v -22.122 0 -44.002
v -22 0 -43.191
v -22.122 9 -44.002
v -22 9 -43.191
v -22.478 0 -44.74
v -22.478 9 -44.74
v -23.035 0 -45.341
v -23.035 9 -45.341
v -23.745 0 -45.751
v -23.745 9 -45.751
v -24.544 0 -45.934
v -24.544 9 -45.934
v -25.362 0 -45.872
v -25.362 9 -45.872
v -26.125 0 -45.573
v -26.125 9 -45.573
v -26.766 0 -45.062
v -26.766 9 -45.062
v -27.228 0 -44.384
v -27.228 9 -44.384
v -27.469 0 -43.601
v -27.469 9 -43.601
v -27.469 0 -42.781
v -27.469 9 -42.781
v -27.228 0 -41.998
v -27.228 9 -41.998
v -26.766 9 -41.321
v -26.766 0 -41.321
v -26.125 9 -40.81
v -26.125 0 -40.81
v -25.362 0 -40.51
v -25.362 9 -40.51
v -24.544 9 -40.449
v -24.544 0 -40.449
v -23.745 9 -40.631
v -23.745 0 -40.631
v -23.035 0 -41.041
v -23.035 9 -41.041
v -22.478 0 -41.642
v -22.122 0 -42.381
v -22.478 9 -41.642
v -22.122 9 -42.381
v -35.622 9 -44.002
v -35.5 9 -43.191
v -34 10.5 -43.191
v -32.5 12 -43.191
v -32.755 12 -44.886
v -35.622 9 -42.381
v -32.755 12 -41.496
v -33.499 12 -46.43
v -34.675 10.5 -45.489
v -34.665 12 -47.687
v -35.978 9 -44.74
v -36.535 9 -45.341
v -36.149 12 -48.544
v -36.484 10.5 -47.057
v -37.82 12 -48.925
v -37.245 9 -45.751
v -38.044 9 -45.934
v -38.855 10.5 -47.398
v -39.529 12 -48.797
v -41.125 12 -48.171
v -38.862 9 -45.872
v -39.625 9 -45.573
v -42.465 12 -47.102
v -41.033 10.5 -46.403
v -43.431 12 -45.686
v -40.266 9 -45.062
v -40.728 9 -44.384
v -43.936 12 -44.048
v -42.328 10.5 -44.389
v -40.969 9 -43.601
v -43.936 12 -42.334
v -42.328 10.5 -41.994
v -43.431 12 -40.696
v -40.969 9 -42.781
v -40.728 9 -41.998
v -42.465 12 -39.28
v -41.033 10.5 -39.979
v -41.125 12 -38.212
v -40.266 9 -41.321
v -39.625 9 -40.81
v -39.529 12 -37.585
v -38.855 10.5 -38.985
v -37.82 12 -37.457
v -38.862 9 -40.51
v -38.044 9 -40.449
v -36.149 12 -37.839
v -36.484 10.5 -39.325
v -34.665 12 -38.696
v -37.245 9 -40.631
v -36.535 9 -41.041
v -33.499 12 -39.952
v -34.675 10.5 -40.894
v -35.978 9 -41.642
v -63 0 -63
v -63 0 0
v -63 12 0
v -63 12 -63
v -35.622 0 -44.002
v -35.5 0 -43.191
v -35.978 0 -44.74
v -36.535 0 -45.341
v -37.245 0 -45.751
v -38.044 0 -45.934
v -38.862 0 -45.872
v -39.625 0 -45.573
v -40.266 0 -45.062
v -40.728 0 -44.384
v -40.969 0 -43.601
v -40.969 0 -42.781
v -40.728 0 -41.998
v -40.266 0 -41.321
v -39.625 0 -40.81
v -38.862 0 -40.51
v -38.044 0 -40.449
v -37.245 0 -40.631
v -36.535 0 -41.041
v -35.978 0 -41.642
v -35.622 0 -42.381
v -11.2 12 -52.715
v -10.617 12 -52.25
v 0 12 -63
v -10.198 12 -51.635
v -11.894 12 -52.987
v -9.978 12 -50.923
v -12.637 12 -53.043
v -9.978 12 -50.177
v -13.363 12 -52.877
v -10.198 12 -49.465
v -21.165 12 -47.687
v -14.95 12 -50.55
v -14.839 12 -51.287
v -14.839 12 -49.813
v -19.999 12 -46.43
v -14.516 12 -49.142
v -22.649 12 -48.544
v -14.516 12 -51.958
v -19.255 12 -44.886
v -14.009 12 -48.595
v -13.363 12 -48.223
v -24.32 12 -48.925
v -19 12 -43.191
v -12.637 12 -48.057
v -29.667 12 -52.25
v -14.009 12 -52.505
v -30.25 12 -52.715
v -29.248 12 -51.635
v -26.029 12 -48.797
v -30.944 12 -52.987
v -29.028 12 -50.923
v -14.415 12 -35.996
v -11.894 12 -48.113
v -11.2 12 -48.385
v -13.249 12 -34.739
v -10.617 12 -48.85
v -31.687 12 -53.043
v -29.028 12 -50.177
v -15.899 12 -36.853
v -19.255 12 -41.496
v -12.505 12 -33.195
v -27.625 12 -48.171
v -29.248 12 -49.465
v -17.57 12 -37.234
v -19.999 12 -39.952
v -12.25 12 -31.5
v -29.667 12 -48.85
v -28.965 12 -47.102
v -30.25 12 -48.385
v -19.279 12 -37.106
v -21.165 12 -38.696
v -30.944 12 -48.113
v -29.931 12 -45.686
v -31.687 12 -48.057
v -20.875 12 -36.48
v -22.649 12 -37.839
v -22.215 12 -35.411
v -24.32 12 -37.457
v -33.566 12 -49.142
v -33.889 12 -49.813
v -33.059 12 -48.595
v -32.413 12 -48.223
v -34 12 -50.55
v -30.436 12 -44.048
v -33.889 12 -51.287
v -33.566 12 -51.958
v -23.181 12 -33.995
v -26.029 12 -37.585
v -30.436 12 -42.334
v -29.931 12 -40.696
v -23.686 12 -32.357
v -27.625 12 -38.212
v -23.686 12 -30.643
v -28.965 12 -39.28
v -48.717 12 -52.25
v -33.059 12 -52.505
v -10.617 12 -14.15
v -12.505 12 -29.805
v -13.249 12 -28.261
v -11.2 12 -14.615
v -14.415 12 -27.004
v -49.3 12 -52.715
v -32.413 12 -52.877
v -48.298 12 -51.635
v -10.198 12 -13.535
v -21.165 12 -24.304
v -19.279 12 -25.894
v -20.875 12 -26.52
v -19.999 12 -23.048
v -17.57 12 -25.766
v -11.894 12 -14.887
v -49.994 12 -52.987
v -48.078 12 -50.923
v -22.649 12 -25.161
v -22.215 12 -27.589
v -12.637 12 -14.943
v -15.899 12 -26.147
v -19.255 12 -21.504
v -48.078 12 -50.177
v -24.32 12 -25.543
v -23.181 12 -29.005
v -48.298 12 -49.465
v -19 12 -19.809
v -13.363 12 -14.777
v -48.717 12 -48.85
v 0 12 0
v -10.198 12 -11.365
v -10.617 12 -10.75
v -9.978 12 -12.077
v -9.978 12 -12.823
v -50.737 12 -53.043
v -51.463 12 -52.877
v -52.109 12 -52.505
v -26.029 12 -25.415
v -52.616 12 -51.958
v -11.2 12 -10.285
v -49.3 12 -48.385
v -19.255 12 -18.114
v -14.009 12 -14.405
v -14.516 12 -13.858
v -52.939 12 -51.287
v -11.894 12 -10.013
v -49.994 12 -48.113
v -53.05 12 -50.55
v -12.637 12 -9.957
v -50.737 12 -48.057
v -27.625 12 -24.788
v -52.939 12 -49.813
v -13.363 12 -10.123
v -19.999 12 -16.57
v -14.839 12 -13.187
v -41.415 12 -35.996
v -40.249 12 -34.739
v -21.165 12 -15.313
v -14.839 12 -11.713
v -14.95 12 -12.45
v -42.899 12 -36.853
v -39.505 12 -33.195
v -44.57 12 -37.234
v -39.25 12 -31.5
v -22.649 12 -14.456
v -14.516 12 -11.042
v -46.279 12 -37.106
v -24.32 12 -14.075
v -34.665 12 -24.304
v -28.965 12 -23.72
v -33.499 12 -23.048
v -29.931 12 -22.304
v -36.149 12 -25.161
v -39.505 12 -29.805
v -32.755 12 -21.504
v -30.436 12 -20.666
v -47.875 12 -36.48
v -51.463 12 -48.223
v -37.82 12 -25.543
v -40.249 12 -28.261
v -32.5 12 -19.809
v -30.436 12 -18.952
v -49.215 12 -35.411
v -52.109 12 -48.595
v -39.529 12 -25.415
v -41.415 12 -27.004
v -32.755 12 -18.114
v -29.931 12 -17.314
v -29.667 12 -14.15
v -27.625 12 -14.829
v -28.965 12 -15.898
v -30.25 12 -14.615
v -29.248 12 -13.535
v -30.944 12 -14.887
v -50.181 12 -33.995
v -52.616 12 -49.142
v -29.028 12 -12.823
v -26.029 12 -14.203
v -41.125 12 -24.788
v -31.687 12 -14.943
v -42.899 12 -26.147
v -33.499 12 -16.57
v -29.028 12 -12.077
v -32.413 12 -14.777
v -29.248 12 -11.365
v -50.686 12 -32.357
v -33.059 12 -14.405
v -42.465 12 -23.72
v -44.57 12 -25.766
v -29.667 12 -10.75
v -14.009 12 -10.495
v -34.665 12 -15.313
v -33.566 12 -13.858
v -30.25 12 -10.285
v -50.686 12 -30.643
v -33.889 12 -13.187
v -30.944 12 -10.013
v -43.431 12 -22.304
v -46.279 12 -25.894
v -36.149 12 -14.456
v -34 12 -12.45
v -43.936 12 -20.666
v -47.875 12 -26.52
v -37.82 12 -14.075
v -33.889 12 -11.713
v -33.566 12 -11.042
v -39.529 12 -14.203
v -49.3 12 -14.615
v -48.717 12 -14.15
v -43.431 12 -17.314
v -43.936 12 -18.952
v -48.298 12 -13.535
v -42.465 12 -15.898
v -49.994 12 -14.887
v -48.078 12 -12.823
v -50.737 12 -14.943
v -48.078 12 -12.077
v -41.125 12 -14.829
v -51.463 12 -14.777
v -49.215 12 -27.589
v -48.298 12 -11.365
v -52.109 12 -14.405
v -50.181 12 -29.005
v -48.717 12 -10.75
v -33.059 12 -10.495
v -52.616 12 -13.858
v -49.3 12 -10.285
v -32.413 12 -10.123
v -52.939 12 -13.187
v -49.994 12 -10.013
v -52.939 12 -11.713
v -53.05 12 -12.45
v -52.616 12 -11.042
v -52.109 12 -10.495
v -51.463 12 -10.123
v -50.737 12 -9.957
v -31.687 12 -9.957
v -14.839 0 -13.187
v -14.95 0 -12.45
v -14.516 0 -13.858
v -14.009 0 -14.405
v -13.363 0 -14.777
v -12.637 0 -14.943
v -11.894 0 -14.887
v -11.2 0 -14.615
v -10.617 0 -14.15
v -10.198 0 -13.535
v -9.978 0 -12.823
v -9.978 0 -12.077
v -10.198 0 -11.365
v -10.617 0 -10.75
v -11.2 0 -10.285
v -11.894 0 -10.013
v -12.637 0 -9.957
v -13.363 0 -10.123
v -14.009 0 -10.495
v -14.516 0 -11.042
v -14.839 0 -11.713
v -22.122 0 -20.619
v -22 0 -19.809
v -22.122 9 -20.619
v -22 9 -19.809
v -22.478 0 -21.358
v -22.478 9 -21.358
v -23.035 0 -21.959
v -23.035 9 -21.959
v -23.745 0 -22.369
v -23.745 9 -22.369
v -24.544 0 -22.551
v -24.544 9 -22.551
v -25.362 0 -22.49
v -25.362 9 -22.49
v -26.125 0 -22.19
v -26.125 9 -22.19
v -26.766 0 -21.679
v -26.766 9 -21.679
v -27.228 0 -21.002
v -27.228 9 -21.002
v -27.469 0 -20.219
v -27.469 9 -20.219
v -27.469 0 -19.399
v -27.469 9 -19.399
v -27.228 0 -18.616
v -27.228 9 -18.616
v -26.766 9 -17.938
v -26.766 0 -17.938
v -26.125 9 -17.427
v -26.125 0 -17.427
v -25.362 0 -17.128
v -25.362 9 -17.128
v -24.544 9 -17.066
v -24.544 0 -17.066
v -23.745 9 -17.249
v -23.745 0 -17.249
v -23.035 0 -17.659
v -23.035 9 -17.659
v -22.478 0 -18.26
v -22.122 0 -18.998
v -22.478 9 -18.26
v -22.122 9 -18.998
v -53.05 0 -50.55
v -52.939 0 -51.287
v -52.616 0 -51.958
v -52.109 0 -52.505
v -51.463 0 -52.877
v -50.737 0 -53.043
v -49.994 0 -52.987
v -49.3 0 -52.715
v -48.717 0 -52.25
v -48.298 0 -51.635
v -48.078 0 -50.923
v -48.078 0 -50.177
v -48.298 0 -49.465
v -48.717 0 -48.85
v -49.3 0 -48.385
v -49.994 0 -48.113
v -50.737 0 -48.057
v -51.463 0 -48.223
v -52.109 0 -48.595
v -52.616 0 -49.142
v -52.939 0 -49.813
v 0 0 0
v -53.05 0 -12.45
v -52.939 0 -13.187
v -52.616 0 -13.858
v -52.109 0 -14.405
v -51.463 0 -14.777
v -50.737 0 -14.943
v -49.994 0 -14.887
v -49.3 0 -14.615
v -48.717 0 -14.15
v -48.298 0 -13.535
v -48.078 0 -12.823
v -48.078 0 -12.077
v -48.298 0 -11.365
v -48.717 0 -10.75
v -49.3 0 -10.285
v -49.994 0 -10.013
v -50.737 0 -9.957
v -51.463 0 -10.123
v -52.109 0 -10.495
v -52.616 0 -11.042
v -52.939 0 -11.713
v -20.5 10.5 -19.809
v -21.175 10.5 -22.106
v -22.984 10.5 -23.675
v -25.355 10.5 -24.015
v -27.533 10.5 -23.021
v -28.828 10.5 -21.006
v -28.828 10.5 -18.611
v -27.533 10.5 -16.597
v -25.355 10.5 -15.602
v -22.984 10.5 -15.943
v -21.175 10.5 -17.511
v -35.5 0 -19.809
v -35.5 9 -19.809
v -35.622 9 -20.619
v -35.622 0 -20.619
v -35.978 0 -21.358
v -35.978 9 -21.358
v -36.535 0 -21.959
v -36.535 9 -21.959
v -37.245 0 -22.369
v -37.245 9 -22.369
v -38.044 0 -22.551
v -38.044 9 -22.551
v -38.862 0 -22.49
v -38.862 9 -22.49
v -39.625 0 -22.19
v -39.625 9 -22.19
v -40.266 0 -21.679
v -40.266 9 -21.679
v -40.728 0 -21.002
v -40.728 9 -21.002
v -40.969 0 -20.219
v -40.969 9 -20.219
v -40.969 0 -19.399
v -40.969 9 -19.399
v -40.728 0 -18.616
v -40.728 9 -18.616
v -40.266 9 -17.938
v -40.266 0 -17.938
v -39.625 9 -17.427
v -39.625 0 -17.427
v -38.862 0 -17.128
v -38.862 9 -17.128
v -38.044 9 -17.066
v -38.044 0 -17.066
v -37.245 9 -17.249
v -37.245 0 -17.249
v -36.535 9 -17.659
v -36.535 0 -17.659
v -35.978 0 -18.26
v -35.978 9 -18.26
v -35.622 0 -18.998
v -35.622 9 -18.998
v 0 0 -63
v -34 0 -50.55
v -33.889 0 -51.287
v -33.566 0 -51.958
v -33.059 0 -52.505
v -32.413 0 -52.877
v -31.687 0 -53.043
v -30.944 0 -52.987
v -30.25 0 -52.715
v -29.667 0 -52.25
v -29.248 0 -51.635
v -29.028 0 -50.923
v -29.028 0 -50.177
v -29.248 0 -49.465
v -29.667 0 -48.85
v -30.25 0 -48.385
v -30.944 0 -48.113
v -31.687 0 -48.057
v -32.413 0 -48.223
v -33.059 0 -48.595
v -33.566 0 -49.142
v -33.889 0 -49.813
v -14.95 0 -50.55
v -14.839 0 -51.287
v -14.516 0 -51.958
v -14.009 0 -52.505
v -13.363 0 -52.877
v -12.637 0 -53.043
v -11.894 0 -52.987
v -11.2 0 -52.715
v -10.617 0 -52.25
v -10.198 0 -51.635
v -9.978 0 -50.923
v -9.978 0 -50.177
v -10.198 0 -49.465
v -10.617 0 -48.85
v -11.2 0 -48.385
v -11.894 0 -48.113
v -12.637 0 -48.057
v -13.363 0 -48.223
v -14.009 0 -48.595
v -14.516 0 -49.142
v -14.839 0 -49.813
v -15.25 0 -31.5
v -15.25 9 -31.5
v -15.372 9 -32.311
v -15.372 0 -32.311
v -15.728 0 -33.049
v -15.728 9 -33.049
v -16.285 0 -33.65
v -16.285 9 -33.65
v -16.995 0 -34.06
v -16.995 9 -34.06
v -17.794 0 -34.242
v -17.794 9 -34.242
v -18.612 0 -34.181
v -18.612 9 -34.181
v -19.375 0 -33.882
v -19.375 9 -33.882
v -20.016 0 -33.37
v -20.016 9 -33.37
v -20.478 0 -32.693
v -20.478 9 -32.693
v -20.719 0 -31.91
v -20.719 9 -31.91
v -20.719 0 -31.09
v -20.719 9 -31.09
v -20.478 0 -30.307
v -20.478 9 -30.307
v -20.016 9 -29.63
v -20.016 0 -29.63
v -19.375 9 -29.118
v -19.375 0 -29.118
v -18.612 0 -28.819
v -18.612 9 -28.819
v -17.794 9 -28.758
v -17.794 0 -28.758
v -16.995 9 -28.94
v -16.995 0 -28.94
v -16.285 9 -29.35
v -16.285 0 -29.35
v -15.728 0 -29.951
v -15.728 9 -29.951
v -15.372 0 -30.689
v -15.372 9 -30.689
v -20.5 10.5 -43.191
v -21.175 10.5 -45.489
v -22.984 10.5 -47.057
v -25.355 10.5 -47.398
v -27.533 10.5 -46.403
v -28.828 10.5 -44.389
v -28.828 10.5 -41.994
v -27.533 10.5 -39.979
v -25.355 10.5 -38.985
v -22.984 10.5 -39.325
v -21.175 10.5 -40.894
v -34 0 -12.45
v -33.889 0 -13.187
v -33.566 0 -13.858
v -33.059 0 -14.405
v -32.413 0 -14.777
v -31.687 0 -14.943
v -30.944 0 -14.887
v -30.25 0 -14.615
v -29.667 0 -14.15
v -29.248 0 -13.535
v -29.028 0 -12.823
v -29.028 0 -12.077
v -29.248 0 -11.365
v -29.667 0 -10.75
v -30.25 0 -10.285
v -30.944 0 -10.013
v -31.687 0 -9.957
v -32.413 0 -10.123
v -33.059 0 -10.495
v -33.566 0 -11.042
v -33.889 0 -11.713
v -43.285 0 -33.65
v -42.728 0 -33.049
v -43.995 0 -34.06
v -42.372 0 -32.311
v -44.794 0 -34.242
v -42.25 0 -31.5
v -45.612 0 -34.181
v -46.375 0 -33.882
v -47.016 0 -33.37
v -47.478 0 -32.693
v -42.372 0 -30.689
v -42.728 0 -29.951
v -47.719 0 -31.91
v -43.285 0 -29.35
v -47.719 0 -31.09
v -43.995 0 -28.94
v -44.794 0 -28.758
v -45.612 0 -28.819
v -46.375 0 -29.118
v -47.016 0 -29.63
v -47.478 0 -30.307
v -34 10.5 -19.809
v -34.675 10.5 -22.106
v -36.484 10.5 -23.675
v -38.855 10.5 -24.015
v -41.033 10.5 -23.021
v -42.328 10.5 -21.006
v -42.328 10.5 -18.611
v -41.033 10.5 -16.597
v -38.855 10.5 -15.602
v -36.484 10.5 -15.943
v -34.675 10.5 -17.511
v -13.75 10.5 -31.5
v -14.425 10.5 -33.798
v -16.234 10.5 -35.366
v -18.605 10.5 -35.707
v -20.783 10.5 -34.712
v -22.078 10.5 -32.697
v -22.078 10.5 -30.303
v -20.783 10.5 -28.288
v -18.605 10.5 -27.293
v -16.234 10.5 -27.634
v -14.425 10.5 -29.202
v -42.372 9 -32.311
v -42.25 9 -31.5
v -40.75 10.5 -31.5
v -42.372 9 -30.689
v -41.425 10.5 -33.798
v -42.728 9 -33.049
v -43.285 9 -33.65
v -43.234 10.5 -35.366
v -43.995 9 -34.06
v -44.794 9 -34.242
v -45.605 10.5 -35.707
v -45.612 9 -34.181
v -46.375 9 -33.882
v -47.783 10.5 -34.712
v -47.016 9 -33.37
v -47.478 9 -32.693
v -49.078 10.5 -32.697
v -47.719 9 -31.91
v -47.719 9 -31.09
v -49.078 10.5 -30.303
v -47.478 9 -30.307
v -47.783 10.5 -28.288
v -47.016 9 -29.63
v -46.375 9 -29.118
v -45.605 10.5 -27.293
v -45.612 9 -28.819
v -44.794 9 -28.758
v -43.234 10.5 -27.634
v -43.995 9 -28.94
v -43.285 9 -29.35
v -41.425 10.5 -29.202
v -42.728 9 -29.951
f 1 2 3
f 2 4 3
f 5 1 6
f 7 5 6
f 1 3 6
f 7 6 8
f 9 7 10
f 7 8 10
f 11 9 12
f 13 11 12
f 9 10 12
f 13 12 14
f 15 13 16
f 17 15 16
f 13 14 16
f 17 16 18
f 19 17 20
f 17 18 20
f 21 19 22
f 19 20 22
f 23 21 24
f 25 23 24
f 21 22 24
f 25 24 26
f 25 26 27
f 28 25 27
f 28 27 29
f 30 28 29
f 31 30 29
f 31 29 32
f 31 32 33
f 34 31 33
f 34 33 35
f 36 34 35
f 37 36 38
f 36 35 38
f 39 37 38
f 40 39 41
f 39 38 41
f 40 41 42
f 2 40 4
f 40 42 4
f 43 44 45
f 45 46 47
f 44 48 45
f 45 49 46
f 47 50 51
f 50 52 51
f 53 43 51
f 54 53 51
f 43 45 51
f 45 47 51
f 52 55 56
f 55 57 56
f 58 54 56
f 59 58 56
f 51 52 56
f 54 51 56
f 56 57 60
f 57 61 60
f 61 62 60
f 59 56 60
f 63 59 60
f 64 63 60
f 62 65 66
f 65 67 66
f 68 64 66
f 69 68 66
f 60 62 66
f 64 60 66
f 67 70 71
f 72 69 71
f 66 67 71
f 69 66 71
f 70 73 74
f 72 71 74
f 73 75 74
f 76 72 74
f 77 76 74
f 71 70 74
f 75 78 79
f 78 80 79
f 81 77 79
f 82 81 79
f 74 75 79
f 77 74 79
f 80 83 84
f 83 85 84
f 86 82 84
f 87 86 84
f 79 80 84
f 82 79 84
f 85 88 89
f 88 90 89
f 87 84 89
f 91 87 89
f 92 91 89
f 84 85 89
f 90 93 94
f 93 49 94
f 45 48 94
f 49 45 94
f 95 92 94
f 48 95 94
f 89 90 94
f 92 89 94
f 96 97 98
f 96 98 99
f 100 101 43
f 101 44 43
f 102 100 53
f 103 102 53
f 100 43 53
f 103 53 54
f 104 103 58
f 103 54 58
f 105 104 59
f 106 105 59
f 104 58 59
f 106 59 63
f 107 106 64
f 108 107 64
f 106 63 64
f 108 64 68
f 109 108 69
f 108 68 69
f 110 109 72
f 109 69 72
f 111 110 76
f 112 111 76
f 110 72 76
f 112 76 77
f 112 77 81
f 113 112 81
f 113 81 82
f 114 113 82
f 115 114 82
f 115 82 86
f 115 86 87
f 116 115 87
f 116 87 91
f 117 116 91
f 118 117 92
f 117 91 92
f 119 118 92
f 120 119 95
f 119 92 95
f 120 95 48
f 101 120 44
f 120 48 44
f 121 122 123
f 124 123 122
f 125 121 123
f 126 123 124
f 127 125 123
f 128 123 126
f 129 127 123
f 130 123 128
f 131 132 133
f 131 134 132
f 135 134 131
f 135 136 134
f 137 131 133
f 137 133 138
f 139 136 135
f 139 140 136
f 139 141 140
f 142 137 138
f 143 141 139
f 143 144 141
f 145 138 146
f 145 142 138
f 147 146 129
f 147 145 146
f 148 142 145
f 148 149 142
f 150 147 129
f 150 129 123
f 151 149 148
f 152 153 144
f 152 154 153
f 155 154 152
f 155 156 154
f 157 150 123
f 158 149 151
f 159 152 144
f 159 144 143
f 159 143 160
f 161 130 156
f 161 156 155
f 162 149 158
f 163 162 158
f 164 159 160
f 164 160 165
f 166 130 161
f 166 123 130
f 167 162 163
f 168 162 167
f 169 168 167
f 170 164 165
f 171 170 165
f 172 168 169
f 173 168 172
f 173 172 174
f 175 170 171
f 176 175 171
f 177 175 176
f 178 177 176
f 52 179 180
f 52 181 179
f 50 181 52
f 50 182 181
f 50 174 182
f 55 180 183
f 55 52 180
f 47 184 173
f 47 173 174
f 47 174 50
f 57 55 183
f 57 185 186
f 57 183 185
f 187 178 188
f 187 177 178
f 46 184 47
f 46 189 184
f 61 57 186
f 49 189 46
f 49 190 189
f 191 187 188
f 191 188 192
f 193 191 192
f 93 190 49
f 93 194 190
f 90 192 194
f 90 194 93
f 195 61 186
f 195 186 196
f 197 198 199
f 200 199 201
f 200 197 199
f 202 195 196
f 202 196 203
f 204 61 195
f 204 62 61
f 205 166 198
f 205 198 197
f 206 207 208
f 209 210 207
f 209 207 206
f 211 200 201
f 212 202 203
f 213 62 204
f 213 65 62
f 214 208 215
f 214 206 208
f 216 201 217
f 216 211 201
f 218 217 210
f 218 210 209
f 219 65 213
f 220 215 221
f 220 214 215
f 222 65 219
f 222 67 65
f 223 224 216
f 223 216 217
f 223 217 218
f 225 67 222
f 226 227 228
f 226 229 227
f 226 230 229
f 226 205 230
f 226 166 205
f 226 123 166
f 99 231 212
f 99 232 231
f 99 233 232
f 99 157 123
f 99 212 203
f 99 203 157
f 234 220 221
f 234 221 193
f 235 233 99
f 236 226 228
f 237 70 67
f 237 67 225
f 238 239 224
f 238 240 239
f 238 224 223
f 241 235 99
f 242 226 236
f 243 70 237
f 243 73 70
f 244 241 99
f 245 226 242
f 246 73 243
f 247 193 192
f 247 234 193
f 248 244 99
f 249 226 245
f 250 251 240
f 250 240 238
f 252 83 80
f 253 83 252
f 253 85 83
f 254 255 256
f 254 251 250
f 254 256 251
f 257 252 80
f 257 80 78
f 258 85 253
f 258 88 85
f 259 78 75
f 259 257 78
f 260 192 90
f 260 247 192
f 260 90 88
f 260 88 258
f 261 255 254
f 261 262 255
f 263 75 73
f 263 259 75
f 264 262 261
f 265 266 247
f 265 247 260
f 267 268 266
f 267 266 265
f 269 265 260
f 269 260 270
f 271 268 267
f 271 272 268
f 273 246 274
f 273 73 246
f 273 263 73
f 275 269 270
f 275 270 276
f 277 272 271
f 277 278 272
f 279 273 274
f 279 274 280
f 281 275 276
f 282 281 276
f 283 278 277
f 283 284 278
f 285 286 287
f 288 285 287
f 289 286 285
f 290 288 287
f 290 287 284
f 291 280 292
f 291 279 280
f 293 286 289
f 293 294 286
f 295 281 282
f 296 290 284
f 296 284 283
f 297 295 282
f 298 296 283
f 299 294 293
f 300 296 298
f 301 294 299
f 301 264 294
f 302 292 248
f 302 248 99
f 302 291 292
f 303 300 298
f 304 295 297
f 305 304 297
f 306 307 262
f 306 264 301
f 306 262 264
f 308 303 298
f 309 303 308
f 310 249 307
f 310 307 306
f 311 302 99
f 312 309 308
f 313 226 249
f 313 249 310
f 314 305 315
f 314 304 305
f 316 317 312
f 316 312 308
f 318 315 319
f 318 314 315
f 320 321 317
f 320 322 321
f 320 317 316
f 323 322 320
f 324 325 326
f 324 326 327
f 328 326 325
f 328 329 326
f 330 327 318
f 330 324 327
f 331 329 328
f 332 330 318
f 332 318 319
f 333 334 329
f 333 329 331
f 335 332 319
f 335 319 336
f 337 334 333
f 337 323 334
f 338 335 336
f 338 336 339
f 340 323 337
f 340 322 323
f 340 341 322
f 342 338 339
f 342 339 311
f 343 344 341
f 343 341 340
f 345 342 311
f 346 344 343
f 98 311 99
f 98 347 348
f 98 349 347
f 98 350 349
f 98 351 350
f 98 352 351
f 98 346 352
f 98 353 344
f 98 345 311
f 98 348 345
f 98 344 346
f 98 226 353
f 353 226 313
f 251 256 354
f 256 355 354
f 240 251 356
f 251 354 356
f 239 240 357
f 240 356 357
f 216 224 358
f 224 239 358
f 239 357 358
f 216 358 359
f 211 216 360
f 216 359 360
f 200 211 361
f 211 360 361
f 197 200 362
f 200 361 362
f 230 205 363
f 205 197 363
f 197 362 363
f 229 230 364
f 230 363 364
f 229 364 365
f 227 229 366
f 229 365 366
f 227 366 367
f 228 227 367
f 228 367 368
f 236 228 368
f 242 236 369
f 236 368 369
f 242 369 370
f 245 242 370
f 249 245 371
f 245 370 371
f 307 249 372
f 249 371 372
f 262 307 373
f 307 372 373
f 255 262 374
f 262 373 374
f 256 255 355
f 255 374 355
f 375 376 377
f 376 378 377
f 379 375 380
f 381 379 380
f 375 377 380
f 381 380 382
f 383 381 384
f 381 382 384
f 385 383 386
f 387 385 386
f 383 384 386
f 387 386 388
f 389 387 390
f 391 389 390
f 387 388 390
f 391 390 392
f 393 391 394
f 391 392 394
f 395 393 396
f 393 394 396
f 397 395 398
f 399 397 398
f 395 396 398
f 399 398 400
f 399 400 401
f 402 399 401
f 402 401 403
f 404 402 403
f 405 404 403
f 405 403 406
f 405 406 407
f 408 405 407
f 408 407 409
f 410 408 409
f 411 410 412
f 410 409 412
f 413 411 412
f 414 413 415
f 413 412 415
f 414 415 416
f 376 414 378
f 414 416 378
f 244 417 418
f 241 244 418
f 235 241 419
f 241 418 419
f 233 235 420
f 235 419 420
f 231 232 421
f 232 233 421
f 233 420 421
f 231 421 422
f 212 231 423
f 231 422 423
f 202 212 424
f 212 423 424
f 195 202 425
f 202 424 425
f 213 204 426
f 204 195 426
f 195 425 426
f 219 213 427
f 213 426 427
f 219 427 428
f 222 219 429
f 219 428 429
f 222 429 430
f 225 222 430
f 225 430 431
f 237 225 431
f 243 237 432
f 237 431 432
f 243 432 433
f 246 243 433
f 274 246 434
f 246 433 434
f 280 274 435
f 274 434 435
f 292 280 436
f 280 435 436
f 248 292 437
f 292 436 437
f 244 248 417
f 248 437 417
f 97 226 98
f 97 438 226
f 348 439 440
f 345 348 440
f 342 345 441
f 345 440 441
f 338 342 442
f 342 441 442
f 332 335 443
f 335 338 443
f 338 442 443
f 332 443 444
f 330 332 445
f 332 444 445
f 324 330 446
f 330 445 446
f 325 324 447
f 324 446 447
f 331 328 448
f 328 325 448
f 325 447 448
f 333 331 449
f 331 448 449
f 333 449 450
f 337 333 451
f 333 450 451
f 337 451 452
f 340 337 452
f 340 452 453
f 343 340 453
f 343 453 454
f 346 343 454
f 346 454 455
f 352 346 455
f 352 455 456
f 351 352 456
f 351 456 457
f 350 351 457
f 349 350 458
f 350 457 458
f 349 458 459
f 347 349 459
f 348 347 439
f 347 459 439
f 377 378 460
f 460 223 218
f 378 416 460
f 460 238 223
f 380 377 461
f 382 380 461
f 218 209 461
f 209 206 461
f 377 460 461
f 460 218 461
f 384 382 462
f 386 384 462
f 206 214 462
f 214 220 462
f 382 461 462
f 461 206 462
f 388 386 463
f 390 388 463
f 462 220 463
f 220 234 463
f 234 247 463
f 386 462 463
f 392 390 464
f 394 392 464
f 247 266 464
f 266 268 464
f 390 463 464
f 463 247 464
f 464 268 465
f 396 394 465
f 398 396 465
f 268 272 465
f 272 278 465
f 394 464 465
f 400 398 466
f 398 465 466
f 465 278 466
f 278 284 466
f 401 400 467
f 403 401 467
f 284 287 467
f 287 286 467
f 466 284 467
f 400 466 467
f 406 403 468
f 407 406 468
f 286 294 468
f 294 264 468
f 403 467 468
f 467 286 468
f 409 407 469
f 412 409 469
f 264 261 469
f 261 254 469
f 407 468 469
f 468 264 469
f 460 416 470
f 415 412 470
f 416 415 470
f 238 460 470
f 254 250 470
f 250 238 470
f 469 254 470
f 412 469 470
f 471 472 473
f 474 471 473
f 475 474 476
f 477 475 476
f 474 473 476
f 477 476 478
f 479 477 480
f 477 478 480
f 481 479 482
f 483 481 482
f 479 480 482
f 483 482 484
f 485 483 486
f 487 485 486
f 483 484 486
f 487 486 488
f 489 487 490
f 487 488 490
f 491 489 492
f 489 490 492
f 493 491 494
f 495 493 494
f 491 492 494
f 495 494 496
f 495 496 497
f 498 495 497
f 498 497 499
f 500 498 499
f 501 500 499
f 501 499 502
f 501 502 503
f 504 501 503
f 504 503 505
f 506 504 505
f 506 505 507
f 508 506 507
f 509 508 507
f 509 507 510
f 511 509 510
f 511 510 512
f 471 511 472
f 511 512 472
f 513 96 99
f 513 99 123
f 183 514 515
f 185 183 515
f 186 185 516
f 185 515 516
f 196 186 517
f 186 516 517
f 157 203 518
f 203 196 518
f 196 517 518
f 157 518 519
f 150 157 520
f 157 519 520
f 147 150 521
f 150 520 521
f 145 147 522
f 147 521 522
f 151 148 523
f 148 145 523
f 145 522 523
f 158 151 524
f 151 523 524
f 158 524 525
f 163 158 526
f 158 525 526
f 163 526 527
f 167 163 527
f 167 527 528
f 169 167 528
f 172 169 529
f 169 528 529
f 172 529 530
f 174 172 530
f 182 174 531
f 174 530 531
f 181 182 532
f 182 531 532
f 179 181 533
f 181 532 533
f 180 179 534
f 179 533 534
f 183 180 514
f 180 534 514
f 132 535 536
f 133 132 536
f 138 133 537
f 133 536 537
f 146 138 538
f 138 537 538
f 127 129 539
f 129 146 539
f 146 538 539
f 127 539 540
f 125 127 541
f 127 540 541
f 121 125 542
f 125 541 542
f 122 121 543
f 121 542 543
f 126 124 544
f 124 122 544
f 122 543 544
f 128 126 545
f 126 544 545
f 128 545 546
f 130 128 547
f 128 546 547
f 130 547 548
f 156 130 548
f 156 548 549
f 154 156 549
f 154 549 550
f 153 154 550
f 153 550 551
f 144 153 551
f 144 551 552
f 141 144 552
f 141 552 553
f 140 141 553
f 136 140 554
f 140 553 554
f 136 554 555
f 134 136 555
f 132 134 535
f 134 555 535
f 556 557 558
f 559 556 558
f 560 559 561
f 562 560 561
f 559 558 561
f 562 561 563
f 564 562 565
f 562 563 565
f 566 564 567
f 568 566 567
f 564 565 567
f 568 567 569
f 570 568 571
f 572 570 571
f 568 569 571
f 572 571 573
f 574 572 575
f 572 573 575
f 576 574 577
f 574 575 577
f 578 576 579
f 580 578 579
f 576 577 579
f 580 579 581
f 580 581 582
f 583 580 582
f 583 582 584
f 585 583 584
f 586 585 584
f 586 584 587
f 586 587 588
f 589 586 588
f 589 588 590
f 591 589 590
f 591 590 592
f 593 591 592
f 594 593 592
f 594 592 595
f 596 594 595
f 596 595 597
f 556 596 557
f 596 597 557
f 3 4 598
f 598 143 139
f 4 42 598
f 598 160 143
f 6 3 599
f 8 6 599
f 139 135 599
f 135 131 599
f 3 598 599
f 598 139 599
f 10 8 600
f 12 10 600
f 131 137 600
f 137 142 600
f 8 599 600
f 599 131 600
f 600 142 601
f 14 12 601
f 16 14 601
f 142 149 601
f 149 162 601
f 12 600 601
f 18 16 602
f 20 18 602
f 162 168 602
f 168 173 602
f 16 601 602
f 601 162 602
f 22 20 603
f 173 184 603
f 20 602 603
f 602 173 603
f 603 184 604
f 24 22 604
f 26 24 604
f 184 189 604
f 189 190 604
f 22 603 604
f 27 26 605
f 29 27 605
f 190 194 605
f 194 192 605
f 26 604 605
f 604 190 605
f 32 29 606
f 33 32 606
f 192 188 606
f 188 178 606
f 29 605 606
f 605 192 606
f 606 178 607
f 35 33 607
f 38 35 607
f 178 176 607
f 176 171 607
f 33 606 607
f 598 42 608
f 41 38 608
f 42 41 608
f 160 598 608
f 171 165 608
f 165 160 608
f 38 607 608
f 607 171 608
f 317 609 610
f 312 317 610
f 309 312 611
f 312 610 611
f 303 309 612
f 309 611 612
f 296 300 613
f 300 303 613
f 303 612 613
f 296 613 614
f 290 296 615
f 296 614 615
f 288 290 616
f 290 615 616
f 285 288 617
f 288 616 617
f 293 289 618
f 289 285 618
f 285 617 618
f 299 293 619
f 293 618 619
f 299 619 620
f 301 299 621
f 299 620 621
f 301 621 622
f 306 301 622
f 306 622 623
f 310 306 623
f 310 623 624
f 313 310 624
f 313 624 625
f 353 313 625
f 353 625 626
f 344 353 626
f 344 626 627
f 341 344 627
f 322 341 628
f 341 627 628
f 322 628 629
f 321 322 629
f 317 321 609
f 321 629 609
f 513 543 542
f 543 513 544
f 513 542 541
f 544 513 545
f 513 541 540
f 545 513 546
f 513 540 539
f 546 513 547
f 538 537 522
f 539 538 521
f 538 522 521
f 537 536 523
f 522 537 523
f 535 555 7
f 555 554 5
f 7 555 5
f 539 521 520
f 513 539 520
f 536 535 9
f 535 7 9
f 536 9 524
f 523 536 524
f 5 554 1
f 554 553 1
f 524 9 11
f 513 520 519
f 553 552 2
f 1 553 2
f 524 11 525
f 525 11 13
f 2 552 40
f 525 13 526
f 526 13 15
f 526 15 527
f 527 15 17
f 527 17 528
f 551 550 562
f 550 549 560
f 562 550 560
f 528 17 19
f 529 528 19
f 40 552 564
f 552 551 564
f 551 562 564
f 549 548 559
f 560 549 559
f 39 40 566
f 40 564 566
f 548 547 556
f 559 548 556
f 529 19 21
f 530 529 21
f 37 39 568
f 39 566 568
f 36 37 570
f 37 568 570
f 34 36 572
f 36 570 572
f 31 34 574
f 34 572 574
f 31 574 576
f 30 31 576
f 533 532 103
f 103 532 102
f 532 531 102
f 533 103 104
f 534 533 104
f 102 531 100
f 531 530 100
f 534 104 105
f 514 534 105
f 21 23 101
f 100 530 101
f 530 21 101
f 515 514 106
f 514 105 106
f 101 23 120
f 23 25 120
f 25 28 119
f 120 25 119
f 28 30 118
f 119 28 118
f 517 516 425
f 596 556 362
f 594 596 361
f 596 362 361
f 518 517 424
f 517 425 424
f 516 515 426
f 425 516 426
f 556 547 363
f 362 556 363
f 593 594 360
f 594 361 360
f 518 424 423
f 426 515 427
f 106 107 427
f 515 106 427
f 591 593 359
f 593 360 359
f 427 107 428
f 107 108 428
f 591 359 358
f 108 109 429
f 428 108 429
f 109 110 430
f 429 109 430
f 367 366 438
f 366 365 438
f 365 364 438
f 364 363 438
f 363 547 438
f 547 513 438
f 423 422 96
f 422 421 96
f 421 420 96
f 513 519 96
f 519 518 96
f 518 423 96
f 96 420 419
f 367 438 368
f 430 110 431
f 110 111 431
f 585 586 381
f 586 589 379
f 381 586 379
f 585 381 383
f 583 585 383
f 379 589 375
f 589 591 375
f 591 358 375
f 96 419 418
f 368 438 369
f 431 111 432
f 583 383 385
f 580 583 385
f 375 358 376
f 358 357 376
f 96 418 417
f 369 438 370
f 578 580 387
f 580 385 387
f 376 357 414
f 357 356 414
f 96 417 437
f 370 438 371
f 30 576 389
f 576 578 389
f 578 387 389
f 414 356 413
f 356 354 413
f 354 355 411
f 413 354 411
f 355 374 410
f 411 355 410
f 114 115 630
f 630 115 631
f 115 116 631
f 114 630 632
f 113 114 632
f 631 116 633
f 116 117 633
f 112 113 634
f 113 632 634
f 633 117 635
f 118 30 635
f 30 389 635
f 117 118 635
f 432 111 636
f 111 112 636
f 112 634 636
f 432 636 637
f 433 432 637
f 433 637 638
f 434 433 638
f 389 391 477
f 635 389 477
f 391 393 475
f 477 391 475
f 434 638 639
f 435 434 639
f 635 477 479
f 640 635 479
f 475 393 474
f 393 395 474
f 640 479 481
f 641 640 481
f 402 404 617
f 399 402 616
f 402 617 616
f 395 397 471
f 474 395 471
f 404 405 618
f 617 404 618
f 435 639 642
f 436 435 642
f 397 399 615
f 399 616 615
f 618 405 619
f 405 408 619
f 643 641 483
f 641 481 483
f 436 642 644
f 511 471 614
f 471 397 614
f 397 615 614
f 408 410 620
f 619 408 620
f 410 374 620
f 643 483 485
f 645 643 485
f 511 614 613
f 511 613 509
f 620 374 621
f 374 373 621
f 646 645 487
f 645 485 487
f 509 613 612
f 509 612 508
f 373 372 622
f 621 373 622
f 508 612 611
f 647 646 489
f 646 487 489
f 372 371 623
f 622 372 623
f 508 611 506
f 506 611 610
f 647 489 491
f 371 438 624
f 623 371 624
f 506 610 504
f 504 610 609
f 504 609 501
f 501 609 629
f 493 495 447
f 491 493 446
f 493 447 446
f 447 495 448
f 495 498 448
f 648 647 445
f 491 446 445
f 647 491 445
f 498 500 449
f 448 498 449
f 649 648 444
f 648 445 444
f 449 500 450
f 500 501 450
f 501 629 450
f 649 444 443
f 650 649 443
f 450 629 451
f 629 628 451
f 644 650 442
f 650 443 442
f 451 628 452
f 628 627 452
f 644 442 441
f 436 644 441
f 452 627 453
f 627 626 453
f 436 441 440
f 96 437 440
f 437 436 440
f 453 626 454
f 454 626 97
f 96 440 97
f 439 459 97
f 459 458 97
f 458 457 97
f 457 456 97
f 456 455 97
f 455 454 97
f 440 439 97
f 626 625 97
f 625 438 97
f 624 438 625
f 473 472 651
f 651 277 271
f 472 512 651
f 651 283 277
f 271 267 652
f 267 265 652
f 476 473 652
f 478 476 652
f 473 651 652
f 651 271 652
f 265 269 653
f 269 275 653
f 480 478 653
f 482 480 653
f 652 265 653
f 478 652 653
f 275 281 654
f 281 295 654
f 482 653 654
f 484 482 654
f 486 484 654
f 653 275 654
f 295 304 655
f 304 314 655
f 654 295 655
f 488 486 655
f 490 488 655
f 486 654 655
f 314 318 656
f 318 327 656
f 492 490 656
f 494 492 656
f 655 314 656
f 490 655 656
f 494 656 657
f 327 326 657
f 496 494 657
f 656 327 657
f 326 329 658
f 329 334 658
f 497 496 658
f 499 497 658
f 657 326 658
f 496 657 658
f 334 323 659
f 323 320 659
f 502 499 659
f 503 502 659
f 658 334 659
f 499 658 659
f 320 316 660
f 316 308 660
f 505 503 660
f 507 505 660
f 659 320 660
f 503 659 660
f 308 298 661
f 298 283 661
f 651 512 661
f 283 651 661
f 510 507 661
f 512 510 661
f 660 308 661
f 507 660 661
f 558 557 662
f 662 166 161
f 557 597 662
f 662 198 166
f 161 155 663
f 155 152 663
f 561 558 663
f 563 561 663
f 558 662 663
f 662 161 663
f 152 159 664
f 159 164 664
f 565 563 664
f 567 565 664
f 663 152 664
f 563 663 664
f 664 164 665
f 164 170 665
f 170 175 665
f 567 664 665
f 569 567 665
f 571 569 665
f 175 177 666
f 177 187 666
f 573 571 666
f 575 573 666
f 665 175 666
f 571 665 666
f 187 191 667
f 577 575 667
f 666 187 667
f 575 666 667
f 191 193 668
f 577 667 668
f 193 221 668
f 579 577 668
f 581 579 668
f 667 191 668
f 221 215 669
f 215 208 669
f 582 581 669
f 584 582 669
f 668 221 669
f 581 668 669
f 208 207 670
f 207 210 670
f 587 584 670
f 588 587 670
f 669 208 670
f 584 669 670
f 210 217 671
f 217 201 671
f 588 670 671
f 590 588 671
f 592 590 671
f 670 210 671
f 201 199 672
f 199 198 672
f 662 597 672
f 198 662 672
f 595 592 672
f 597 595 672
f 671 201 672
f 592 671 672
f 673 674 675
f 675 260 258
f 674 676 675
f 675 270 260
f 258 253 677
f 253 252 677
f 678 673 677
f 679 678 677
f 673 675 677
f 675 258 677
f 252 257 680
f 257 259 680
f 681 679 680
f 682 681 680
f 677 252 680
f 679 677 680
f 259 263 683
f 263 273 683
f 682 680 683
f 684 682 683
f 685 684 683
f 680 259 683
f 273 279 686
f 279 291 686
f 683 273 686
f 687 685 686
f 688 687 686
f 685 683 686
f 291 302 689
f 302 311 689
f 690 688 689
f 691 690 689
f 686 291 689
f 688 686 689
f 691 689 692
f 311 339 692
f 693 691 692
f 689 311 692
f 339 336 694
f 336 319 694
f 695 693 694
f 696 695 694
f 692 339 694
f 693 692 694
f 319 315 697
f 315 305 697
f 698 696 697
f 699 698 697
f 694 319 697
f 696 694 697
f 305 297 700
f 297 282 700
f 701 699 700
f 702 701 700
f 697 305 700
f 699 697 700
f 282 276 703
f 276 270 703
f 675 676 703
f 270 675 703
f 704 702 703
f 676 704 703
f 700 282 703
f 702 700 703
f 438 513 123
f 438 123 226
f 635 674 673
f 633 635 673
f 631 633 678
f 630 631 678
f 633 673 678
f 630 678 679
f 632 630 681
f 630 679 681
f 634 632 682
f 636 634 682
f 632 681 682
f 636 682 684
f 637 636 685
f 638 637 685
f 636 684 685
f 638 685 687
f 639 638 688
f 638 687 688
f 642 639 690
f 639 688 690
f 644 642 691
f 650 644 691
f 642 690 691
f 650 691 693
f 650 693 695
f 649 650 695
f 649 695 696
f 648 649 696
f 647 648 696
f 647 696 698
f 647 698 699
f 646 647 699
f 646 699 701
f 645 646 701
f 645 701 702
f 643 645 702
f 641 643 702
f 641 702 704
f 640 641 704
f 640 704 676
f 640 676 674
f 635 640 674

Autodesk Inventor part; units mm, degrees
ref_plane "YZ Plane" through (0, 0, 0) normal (1, 0, 0) x (0, 1, 0)
ref_plane "XZ Plane" through (0, 0, 0) normal (0, 1, 0) x (-1, 0, 0)
ref_plane "XY Plane" through (0, 0, 0) normal (0, 0, 1) x (1, 0, 0)
sketch "Sketch1" plane through (0, 0, 0) normal (0, 1, 0) x (-1, 0, 0)
  line L0 (0, 0) -> (63, 0)
  line L1 (63, 0) -> (63, -63)
  line L2 (63, -63) -> (0, -63)
  line L3 (0, -63) -> (0, 0)
  circle A0 centre (31.5, -31.5) radius 3.1
  circle A1 centre (12.45, -12.45) radius 2.5
  circle A2 centre (31.5, -12.45) radius 2.5
  circle A3 centre (50.55, -12.45) radius 2.5
  circle A4 centre (12.45, -50.55) radius 2.5
  circle A5 centre (31.5, -50.55) radius 2.5
  circle A6 centre (50.55, -50.55) radius 2.5
  point P0 (31.5, -63)
  dimension "d0" = 63
  dimension "d1" = 63
  dimension "d2" = 6.2
  dimension "d3" = 31.5
  dimension "d4" = 31.5
  dimension "d5" = 19.05
  dimension "d6" = 19.05
  dimension "d7" = 5
  dimension "d10" = 19.05
  dimension "d13" = 38.1
extrude "Extrusion1" add sketch "Sketch1" along normal blind 12 contours L0 L1 L2 L3 | A0
sketch "Sketch2" plane through (0, 12, 0) normal (0, 1, 0) x (1, 0, 0)
  circle A0 centre (-45, 31.5) radius 2.75
  circle A1 centre (-31.5, 31.5) radius 3.1 projected
  circle A2 centre (-38.25, 19.8087) radius 2.75
  circle A3 centre (-24.75, 19.8087) radius 2.75
  circle A4 centre (-18, 31.5) radius 2.75
  circle A5 centre (-24.75, 43.1913) radius 2.75
  circle A6 centre (-38.25, 43.1913) radius 2.75
  point P0 (0, 0)
  dimension "d18" = 5.5
  dimension "d19" = 13.5
  dimension "d20" = 0
  dimension "d23" = 360
extrude "Extrusion2" cut sketch "Sketch2" against normal blind 12 contours A0 | A2 | A3 | A4 | A5 | A6
chamfer "Chamfer1" distance 3 angle 45 6 edges at (-41, 12, -43.1913) (-47.75, 12, -31.5) (-41, 12, -19.8087) (-27.5, 12, -19.8087) (-20.75, 12, -31.5) (-27.5, 12, -43.1913)
thread "Thread2" size "M6x1" class "6H" standard "ANSI Metric M Profile" full length
thread "Thread3" size "M5x0.8" class "6H" standard "ANSI Metric M Profile" full length
thread "Thread4" size "M5x0.8" class "6H" standard "ANSI Metric M Profile" full length
thread "Thread5" size "M5x0.8" class "6H" standard "ANSI Metric M Profile" full length
thread "Thread6" size "M5x0.8" class "6H" standard "ANSI Metric M Profile" full length
thread "Thread7" size "M5x0.8" class "6H" standard "ANSI Metric M Profile" full length
equation "\"d3\" = 0.5 * d1"
equation "\"d4\" = 0.5 * d0"
properties part number "Adapter plate for tube dovetail bracket"
